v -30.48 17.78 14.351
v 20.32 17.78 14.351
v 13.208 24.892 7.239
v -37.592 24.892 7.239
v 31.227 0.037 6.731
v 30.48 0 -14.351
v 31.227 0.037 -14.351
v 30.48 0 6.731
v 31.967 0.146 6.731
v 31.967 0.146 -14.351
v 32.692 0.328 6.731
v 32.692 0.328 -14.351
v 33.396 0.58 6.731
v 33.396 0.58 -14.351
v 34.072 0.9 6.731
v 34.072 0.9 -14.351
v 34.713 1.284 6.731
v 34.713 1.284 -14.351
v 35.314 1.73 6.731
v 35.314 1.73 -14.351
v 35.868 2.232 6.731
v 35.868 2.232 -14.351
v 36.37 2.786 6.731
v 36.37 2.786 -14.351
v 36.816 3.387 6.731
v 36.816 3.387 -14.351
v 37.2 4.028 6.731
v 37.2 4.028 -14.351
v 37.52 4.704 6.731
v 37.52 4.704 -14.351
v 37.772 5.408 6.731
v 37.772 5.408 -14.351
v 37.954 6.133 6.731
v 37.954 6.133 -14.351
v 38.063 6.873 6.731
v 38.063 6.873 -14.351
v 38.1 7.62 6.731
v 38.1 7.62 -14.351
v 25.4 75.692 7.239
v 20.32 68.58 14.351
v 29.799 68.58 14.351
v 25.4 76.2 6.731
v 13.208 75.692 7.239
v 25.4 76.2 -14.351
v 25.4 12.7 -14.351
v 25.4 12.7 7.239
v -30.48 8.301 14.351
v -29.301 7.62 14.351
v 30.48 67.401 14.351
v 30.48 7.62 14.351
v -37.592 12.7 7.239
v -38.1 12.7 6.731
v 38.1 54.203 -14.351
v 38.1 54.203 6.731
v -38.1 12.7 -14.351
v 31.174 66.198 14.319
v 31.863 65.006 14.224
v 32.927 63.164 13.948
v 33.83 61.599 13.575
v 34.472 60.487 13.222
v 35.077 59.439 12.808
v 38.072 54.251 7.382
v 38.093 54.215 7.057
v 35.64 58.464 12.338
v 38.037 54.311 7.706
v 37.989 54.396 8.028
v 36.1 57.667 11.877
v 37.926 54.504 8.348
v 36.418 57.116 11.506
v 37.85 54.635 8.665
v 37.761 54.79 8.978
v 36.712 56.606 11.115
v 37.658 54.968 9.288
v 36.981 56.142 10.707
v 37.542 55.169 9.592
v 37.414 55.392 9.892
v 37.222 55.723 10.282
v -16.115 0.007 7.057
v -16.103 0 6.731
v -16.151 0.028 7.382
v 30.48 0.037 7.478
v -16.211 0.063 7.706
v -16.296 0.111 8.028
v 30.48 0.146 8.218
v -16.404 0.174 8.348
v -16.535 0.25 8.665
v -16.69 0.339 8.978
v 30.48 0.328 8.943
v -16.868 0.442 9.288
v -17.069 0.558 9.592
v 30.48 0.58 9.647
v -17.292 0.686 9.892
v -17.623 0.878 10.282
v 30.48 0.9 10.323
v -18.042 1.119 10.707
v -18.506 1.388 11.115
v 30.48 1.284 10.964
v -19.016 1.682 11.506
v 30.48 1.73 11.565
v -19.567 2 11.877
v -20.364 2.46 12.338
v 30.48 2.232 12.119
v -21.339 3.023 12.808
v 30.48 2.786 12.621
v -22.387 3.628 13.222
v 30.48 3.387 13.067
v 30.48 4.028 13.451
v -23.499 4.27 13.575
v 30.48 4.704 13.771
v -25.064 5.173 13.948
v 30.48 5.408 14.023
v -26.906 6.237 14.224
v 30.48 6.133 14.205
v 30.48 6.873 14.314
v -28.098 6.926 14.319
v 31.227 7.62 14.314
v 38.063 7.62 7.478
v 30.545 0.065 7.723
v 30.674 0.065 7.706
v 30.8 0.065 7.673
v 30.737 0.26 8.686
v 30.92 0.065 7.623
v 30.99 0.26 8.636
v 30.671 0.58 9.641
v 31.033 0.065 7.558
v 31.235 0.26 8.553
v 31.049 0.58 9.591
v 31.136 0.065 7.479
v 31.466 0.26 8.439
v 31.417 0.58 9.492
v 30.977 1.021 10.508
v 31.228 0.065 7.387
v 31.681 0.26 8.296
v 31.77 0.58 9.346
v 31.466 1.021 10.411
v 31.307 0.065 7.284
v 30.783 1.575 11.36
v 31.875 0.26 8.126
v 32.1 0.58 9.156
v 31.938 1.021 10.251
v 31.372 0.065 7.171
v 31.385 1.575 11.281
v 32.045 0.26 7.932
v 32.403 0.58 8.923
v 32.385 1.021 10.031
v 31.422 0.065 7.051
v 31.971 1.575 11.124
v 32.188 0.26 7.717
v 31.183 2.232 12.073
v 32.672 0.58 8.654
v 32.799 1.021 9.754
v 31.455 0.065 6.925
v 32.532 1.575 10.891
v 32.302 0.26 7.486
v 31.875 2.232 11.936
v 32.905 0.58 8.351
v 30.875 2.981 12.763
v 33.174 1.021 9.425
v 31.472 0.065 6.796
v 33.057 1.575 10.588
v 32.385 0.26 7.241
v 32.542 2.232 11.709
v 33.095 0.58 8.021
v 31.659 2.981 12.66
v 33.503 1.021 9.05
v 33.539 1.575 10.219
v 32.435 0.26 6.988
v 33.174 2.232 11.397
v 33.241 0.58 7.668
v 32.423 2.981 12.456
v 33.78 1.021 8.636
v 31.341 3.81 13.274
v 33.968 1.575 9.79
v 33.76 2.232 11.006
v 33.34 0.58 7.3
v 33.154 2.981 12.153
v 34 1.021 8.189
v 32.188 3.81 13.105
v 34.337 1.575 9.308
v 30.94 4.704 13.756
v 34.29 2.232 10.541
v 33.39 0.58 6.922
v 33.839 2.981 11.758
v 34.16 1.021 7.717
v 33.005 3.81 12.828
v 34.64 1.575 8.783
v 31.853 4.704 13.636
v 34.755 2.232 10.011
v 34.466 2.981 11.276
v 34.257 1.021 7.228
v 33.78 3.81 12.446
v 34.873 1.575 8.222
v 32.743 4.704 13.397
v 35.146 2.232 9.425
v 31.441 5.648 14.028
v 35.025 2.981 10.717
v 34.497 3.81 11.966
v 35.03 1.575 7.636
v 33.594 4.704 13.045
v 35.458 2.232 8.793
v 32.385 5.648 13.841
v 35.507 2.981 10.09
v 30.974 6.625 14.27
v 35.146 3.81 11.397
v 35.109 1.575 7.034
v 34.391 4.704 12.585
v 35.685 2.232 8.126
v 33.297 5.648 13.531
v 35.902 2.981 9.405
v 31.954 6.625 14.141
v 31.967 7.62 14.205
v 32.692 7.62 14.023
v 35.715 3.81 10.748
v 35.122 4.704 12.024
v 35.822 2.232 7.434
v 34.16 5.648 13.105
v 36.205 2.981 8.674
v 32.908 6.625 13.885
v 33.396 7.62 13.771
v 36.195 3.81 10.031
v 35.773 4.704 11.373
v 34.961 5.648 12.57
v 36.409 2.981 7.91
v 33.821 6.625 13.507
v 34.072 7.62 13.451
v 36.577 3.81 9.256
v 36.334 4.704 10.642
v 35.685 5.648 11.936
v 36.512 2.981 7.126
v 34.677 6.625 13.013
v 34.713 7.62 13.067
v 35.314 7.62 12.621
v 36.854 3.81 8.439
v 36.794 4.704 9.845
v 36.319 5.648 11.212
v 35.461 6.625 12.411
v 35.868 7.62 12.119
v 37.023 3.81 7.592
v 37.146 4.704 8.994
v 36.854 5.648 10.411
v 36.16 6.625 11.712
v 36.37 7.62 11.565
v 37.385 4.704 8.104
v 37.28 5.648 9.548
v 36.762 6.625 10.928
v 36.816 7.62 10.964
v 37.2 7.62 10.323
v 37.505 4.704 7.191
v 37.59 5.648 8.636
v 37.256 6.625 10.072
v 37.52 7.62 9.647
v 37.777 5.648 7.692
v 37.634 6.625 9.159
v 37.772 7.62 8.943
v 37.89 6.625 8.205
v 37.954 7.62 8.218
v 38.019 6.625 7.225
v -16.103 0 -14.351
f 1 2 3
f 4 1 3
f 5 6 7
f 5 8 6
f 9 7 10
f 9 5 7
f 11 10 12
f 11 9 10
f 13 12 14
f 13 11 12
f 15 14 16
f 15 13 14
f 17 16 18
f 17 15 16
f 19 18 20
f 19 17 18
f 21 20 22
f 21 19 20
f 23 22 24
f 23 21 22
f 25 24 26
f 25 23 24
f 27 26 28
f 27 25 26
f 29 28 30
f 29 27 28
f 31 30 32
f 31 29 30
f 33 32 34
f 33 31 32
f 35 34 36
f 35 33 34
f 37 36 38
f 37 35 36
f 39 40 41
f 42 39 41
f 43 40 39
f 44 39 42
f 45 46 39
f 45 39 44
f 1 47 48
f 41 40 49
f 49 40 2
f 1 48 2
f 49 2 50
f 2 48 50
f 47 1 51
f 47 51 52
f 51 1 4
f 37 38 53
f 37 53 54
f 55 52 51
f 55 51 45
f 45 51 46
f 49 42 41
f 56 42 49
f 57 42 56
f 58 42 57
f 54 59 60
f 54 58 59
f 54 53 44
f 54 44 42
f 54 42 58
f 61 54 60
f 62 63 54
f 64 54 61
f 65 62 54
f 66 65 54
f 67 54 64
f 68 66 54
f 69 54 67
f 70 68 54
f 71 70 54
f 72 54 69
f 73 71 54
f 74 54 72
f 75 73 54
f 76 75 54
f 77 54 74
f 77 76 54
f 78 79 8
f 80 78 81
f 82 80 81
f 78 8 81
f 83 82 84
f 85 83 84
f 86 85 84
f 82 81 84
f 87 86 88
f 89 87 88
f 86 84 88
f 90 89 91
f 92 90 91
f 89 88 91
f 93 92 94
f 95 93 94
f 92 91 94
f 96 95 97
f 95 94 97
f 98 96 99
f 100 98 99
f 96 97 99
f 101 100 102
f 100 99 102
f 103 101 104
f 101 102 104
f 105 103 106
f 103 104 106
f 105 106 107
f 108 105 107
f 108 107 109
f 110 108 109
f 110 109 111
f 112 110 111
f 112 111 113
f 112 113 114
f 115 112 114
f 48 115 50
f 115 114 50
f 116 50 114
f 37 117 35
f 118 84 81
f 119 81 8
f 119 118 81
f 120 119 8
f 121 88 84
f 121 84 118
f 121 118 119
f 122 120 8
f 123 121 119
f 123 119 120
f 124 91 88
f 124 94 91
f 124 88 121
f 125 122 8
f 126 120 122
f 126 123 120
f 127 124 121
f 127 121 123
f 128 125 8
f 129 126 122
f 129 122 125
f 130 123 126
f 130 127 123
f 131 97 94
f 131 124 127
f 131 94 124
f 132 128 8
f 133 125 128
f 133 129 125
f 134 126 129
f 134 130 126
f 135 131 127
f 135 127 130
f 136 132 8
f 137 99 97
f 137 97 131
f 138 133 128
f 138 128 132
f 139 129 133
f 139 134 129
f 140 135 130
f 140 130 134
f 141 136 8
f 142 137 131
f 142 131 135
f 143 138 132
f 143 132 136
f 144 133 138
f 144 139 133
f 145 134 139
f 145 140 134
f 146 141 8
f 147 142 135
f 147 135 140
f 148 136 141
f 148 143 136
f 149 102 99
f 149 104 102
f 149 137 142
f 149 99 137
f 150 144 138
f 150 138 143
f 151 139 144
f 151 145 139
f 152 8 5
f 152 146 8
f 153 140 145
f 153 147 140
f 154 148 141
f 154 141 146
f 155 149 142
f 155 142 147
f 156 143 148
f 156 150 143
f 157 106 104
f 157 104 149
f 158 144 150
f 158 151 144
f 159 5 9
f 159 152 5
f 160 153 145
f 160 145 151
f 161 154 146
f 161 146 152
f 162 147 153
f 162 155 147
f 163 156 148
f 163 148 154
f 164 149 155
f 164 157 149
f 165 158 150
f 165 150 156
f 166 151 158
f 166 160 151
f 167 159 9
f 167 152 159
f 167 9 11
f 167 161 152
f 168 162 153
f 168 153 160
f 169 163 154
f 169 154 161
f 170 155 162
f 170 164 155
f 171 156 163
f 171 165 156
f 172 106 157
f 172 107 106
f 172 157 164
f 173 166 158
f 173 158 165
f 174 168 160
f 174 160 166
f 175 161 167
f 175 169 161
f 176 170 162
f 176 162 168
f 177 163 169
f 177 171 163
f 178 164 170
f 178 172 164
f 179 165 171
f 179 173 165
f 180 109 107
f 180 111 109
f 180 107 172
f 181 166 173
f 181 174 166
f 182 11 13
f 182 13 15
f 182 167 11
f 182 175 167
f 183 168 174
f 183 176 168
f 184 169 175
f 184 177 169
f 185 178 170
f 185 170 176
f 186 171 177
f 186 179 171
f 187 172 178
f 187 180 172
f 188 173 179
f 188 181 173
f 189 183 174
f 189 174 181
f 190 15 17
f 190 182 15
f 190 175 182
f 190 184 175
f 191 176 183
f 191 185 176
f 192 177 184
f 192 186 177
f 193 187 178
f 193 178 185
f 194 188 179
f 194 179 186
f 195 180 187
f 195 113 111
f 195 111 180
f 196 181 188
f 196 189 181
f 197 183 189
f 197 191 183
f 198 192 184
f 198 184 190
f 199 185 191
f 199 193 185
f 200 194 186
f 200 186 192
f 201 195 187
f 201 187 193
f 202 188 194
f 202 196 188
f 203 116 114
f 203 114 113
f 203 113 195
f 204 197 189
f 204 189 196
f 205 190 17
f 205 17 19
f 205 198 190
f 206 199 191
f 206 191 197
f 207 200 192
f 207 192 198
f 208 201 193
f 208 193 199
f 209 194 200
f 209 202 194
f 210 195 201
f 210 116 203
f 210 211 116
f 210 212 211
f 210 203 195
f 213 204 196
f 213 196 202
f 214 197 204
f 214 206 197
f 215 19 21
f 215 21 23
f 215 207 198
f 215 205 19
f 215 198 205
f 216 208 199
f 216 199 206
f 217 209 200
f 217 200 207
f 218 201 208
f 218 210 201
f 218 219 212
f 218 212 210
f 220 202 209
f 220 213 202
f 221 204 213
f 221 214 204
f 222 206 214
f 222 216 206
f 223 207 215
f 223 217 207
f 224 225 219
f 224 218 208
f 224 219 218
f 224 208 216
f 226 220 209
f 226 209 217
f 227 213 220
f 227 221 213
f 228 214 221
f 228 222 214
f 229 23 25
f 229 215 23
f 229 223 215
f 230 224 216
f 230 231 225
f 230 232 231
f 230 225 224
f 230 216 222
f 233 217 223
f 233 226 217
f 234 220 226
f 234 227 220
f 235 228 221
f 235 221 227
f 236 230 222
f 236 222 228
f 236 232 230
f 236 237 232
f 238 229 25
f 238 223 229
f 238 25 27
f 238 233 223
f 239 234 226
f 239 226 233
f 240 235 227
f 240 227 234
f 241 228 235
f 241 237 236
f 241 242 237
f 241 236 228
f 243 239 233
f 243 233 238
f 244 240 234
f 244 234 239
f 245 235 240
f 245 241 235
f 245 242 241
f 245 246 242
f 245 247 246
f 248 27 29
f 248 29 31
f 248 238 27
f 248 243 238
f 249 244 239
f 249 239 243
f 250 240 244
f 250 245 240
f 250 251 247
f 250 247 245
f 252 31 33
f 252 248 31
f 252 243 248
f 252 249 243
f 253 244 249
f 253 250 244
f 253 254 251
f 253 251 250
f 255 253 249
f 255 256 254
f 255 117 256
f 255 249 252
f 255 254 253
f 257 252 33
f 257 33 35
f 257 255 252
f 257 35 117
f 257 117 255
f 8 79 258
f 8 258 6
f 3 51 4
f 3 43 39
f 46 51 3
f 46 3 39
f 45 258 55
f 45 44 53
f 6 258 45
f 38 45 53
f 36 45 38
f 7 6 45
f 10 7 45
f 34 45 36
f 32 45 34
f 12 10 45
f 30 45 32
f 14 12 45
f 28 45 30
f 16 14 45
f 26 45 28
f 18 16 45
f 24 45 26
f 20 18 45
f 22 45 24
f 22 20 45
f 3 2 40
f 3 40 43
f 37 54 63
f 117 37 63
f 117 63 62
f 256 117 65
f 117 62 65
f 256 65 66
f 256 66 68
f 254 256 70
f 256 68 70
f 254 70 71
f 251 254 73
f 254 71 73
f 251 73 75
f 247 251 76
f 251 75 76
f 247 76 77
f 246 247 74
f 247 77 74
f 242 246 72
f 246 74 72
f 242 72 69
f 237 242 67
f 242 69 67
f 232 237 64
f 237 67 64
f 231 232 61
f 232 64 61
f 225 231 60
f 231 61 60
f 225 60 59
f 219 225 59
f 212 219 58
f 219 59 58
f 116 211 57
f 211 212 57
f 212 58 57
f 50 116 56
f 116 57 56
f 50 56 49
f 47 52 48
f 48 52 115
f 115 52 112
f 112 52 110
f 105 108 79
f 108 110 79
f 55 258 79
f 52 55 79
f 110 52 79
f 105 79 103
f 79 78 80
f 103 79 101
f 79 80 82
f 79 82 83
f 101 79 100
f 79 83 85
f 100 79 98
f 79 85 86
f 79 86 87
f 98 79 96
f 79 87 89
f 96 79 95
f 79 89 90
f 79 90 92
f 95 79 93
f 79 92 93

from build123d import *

# Parameters (mm, degrees)
F1_DEPTH     = 12.7
F0_W         = 50.8
F0_H         = 7.112
F2_DEPTH     = 25.4
F0_W_2       = 12.7
F0_H_2       = 21.59
F3_DEPTH     = 76.2
F4_DEPTH     = 76.2
F5_SIZE2     = 21.9970452561
F5_SIZE      = 12.7
F6_SIZE2     = 21.9970452561
F6_SIZE      = 12.7
F7_R         = 7.62
F8_T1_DEPTH  = 70.3962243683
F8_T3_DEPTH  = 70.3962243683
F8_T5_DEPTH  = 51.8924487366
F8_T7_DEPTH  = 51.8924487366
F8_T13_DEPTH = 89.9924487366
F8_T17_DEPTH = 89.9924487366


# Not quite as in the source:
# - a fillet or chamfer that OpenCascade refuses, or shapes differently, is made with other operations: its cross-section is extruded or revolved along the edge and cut away or added


with BuildPart() as f1:
    # F0 (on Front) → F1 (new body)
    with BuildSketch(Plane.XZ):
        Polygon((25.4, -14.351), (25.4, 7.239), (12.7, 7.239), (-38.1, 7.239), (-38.1, -14.351), align=None)
    extrude(amount=-F1_DEPTH)

    # F0 (on Front) → F2 (join)
    with BuildSketch(Plane.XZ):
        with Locations((-12.7, 10.795)):
            Rectangle(F0_W, F0_H)
    extrude(amount=-F2_DEPTH)

    # F0 (on Front) → F3 (join)
    with BuildSketch(Plane.XZ):
        with Locations((31.75, -3.556)):
            Rectangle(F0_W_2, F0_H_2)
        with Locations((31.75, 10.795)):
            Rectangle(F0_W_2, F0_H)
    extrude(amount=-F3_DEPTH)

    # F0 (on Front) → F4 (join)
    with BuildSketch(Plane.XZ):
        with Locations((19.05, 10.795)):
            Rectangle(F0_W_2, F0_H)
    extrude(amount=-F4_DEPTH)

    # F5
    f5_edges = [f1.edges().sort_by_distance(p)[0] for p in [
        (38.1, 76.2, 0),
    ]]
    f5_side = f1.faces().sort_by_distance((29.228014, 76.2, 2.143688))[0]
    chamfer(f5_edges, length=F5_SIZE, length2=F5_SIZE2, reference=f5_side)

    # F6
    f6_edges = [f1.edges().sort_by_distance(p)[0] for p in [
        (-38.1, 0, 0),
    ]]
    chamfer(f6_edges, length=F6_SIZE, length2=F6_SIZE2)

    # F7
    f7_edges = [f1.edges().sort_by_distance(p)[0] for p in [
        (38.1, 27.101477, 14.351),
        (10.998523, 0, 14.351),
        (38.1, 0, 0),
    ]]
    fillet(f7_edges, radius=F7_R)

    # F8: chamfer of 7.62 on 4 edges, made by hand

    # F8_s2 → F8_t1 (cut)
    with BuildSketch(Plane.YZ.offset(-57.6962243683)):
        Polygon((17.78, 14.351), (25.4, 6.731), (25.4, 14.351), align=None)
    extrude(amount=F8_T1_DEPTH, mode=Mode.SUBTRACT)

    # F8_s4 → F8_t3 (cut)
    with BuildSketch(Plane.XZ.offset(-95.7962243683)):
        Polygon((20.32, 14.351), (12.7, 6.731), (12.7, 14.351), align=None)
    extrude(amount=F8_T3_DEPTH, mode=Mode.SUBTRACT)

    # F8_s6 → F8_t5 (cut)
    with BuildSketch(Plane.YZ.offset(-6.8962243683)):
        Polygon((68.58, 14.351), (76.2, 6.731), (76.2, 14.351), align=None)
    extrude(amount=F8_T5_DEPTH, mode=Mode.SUBTRACT)

    # F8_s8 → F8_t7 (cut)
    with BuildSketch(Plane.XZ.offset(-44.9962243683)):
        Polygon((-30.48, 14.351), (-38.1, 6.731), (-38.1, 14.351), align=None)
    extrude(amount=F8_T7_DEPTH, mode=Mode.SUBTRACT)


with BuildPart() as f8_tool11:
    # F8_s12 → F8_t13 (new body)
    with BuildSketch(Plane.YZ.offset(32.2962243683)):
        Polygon((17.78, 14.351), (25.4, 6.731), (25.4, 14.351), align=None)
    extrude(amount=-F8_T13_DEPTH)

    split(bisect_by=Plane.YZ.offset(12.7), keep=Keep.TOP)


with BuildPart() as f8_tool15:
    # F8_s16 → F8_t17 (new body)
    with BuildSketch(Plane.XZ.offset(-5.8037756317)):
        Polygon((20.32, 14.351), (12.7, 6.731), (12.7, 14.351), align=None)
    extrude(amount=-F8_T17_DEPTH)

    split(bisect_by=Plane.XZ.offset(-25.4), keep=Keep.TOP)


with BuildPart() as f8_tool11_1:
    add(f8_tool11.part)

    # F8_t19: intersect F8_tool15
    add(f8_tool15.part, mode=Mode.INTERSECT)


with BuildPart() as f1_1:
    add(f1.part)

    # F8_t9: cut F8_tool11
    add(f8_tool11_1.part, mode=Mode.SUBTRACT)


solid = f1_1.part
